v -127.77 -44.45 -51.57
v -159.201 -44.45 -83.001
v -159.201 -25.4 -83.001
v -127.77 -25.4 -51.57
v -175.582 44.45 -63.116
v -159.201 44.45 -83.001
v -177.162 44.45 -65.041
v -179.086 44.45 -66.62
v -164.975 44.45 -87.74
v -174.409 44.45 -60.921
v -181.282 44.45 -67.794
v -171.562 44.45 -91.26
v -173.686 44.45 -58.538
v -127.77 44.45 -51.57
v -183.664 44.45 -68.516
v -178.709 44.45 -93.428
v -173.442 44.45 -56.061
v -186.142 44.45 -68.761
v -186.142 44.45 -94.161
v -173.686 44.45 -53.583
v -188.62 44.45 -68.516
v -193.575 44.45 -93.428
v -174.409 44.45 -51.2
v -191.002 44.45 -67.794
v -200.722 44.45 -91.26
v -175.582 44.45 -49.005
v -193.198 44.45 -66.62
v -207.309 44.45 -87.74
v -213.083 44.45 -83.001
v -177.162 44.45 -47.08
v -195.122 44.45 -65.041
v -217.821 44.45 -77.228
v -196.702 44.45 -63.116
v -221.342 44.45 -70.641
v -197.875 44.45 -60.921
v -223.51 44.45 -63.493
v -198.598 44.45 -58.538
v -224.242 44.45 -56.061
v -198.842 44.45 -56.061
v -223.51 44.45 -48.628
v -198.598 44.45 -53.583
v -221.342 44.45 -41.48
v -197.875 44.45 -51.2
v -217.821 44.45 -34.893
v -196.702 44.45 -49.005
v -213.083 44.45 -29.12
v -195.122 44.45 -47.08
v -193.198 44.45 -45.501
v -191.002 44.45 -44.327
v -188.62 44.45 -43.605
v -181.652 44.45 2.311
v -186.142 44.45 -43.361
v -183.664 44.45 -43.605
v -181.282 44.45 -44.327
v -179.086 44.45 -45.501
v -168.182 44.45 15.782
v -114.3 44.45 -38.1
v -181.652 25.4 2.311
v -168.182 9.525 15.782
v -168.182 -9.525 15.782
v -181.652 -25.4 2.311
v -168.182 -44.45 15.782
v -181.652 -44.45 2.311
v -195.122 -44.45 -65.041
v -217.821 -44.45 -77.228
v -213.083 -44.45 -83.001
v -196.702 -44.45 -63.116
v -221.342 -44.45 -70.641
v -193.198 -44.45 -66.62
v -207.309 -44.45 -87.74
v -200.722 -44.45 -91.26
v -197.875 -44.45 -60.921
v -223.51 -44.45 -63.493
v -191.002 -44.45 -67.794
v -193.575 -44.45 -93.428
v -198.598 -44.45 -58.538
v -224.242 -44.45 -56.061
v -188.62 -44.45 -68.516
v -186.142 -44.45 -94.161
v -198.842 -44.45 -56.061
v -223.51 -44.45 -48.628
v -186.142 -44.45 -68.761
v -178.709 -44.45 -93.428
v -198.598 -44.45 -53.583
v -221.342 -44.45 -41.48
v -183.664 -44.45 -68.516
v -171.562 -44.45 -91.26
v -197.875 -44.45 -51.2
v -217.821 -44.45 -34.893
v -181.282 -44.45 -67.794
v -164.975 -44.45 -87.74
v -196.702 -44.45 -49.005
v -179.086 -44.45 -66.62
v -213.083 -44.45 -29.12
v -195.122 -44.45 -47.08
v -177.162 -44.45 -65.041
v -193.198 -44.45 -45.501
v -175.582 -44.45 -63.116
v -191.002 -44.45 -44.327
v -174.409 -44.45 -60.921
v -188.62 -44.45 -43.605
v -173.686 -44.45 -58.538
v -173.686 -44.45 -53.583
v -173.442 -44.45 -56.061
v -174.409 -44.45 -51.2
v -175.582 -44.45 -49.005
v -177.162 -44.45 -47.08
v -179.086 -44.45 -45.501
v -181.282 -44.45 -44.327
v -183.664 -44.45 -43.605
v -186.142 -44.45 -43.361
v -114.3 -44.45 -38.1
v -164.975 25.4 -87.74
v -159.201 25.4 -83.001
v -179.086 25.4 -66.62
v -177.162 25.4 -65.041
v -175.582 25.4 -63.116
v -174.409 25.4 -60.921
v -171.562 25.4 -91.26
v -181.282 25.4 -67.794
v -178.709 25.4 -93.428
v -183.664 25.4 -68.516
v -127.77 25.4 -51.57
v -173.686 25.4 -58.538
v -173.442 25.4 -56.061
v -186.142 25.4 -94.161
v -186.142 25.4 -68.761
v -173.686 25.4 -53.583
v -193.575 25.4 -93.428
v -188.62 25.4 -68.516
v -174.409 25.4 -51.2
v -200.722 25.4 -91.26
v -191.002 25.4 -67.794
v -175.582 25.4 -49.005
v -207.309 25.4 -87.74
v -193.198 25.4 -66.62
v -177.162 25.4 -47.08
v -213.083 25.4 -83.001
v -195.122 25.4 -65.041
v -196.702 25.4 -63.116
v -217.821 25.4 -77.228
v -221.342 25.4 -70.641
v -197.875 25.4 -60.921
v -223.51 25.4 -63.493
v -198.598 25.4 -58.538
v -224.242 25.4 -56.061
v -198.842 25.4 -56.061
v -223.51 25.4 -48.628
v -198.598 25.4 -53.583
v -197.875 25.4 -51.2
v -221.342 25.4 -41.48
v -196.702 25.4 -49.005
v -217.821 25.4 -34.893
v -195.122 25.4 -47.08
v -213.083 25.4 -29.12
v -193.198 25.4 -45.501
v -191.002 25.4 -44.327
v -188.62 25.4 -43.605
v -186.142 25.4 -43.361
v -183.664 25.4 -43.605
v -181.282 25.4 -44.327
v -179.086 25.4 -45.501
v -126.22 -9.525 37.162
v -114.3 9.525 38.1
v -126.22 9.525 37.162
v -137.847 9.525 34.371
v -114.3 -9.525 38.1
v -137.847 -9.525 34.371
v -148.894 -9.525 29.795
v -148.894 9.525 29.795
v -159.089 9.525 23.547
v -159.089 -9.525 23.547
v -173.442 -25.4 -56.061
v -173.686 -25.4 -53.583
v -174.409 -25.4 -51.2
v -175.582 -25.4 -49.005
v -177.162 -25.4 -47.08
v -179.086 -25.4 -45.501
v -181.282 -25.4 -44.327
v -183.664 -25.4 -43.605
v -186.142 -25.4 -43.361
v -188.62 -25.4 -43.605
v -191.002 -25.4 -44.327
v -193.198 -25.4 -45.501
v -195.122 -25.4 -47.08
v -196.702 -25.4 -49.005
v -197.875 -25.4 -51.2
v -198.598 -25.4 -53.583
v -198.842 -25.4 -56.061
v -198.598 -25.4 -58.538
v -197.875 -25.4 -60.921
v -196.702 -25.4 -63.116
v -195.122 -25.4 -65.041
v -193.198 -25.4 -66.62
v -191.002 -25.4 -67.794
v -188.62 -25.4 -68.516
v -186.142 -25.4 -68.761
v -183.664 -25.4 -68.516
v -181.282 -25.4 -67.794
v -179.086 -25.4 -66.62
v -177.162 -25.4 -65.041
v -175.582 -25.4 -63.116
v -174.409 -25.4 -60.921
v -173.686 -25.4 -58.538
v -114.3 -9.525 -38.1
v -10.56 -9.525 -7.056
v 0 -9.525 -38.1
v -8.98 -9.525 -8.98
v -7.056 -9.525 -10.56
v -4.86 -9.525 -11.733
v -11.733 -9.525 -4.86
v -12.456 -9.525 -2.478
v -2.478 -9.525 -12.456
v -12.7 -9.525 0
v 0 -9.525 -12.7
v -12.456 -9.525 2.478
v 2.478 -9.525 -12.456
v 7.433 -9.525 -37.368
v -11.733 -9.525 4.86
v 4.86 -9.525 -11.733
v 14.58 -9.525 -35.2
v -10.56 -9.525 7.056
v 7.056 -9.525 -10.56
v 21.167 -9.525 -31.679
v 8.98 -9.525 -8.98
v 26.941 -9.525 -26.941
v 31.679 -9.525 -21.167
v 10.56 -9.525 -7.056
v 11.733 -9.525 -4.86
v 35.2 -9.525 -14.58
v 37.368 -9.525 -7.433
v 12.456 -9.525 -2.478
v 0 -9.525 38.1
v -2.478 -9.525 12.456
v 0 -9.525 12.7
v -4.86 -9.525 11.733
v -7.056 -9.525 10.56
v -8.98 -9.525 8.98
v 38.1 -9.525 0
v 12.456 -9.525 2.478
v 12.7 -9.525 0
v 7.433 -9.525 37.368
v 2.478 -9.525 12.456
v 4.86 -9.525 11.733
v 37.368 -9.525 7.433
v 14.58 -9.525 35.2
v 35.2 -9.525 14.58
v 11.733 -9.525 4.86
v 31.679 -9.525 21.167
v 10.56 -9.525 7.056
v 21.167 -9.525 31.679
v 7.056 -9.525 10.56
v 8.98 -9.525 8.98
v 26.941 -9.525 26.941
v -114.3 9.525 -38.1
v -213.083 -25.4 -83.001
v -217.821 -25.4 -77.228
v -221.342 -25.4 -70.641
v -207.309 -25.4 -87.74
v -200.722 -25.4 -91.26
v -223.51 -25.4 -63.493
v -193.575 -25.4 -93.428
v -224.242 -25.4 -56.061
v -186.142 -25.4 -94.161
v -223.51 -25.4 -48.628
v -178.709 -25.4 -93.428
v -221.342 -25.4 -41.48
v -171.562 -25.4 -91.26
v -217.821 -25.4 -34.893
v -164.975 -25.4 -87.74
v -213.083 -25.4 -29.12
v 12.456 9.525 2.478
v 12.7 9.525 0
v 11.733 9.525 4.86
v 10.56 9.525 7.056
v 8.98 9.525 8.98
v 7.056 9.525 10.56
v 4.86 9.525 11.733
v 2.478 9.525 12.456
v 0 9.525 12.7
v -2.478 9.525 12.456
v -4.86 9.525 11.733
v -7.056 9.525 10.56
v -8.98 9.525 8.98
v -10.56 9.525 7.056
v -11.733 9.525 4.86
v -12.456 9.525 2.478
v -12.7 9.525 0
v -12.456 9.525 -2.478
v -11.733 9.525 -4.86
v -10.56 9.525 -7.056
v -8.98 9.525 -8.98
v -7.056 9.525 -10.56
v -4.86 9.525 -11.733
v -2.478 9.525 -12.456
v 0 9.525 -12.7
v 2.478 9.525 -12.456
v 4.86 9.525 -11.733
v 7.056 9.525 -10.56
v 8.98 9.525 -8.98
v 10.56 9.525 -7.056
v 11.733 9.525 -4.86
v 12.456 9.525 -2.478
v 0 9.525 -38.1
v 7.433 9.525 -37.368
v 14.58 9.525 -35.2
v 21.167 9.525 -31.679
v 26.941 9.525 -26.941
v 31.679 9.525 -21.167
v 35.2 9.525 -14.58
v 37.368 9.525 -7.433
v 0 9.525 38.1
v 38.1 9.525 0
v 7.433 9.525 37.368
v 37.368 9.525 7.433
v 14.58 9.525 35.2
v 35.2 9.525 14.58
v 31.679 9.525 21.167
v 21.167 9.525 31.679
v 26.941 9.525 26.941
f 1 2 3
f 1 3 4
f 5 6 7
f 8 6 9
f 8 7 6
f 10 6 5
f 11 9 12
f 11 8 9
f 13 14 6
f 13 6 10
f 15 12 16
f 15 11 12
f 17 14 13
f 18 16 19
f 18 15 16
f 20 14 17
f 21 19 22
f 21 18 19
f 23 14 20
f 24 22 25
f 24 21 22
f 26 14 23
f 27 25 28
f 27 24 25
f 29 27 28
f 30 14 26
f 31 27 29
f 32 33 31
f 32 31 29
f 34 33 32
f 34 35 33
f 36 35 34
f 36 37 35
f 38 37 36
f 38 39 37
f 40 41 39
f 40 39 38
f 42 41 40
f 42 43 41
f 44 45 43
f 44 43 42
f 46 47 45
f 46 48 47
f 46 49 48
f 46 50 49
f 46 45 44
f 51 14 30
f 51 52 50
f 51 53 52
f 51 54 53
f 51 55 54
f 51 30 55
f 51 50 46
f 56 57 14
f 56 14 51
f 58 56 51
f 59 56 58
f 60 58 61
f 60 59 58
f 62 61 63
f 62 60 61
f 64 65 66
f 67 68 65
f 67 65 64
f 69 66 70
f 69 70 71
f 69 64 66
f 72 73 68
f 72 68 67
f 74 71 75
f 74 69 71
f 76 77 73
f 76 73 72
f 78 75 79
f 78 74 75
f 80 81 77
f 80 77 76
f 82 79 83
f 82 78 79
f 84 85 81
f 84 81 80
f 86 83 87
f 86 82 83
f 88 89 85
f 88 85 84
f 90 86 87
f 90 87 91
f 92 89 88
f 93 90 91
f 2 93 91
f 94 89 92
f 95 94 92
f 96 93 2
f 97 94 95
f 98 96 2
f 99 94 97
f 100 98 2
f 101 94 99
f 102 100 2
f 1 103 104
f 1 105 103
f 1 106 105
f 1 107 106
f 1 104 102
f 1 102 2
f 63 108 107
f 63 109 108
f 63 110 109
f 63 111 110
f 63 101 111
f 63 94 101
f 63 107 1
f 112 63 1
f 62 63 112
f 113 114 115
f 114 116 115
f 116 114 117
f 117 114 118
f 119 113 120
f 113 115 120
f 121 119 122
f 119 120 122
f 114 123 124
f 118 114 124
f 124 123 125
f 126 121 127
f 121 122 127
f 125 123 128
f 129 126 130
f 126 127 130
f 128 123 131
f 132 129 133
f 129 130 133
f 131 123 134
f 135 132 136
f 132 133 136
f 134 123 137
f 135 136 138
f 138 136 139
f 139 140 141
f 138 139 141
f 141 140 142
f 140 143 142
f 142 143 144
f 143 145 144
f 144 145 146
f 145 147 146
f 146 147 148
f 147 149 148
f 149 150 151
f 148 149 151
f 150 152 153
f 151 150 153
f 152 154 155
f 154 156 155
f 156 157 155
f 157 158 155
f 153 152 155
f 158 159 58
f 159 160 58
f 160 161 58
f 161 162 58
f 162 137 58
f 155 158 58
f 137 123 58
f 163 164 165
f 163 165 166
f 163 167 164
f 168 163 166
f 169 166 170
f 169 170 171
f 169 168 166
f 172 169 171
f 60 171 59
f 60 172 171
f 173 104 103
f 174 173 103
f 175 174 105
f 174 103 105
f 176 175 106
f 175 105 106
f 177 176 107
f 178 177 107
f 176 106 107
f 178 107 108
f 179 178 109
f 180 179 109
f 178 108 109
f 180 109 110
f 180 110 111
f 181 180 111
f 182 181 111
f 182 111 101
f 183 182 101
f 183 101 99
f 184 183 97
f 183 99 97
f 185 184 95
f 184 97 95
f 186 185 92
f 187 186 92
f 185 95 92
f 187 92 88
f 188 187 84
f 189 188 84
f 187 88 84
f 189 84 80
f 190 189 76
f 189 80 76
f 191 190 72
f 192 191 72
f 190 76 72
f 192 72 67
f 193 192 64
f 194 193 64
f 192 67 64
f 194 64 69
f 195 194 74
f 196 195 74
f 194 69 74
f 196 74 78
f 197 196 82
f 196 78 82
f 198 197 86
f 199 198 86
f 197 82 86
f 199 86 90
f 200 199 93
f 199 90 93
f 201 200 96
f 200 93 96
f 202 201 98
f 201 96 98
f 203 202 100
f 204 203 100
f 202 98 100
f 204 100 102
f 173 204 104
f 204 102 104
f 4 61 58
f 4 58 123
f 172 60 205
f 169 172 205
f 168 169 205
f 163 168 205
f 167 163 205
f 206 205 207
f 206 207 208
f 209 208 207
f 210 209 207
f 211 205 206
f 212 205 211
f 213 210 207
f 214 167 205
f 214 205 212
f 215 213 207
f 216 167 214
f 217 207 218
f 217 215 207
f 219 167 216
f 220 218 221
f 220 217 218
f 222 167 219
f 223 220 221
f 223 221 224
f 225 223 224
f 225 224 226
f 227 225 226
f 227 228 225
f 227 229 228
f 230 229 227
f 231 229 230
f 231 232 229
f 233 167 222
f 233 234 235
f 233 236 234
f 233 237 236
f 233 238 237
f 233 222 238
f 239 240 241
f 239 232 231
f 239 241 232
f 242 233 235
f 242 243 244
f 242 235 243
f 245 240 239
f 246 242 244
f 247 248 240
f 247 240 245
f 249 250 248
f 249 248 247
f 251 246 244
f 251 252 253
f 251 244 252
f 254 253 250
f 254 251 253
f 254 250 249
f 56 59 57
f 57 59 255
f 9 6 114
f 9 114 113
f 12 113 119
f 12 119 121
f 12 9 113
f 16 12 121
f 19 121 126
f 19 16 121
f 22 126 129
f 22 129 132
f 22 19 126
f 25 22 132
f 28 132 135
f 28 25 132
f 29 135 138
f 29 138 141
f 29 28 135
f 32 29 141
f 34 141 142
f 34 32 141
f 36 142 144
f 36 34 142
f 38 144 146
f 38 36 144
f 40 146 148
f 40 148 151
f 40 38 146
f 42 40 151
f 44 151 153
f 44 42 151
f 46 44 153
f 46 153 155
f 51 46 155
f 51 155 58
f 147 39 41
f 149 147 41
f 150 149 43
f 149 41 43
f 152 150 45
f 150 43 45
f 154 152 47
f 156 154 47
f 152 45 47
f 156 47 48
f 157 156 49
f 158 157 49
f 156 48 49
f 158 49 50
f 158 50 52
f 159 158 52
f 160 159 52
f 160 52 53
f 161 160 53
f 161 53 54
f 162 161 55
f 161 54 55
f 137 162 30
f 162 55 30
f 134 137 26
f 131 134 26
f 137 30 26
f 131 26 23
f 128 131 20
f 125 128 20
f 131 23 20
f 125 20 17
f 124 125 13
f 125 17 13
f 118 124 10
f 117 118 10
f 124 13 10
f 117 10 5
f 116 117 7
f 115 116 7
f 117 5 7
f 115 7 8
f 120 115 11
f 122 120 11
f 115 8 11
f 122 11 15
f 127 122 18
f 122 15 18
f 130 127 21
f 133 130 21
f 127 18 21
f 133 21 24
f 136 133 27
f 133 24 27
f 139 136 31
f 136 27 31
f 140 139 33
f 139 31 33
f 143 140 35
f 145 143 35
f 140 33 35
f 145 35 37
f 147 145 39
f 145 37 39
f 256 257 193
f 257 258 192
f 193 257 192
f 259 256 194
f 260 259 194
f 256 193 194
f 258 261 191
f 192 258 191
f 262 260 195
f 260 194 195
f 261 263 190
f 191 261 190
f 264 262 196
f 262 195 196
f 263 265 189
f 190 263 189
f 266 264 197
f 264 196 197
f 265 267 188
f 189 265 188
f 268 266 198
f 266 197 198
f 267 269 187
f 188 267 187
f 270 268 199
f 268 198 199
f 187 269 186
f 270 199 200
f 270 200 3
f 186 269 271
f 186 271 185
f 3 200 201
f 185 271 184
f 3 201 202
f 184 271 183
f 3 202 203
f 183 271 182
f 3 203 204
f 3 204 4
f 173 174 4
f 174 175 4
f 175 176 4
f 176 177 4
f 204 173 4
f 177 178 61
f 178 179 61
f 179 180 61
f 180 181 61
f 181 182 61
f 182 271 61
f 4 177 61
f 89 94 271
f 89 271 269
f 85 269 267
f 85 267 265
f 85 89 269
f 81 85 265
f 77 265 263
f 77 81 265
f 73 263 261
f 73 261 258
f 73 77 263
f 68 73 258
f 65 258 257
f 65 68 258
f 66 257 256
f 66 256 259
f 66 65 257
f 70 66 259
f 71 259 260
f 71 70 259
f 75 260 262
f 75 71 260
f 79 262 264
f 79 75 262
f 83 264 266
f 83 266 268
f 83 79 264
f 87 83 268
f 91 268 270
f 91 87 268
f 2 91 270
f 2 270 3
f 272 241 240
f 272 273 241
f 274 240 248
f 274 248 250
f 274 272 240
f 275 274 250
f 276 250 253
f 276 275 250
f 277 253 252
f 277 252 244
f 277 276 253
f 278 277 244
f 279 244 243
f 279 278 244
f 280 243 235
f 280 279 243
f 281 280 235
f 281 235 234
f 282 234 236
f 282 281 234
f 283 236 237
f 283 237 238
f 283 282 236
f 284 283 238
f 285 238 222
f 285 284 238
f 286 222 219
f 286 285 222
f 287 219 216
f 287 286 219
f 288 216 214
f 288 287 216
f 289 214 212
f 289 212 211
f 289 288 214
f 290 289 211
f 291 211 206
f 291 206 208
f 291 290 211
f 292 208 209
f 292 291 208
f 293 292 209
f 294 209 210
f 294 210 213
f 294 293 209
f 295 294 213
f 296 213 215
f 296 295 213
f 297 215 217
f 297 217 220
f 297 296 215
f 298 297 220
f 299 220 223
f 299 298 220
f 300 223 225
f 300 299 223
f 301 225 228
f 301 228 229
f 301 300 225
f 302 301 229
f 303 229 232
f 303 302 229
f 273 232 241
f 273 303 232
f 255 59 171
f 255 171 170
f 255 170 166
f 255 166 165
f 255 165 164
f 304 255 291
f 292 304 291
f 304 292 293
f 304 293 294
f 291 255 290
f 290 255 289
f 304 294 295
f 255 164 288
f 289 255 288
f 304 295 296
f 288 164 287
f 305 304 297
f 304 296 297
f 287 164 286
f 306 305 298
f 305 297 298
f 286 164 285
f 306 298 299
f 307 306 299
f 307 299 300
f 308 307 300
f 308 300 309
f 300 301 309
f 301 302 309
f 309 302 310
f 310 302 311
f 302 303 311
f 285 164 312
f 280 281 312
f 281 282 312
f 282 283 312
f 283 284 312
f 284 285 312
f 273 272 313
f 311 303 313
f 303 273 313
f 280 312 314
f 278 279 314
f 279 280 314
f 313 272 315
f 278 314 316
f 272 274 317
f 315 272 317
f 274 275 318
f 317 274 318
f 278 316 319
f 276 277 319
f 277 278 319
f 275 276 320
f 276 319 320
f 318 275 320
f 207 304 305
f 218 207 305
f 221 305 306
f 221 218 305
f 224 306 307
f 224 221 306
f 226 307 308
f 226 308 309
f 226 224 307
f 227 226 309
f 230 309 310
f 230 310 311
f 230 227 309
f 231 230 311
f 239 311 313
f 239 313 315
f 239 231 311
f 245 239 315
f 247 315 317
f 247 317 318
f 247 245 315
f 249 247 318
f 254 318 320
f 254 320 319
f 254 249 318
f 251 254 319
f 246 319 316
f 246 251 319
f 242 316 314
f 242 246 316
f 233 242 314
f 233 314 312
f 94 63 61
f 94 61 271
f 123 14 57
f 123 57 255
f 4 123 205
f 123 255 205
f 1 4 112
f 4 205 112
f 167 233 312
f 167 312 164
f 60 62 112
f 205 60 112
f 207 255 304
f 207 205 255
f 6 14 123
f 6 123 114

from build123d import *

# Parameters (mm, degrees)
F0_R     = 12.7
F1_DEPTH = 9.525
F2_W     = 76.2
F2_H     = 88.9
F3_DEPTH = 19.05
F4_R     = 12.7
F5_DEPTH = 19.05
F6_R     = 12.7
F7_DEPTH = 19.05


with BuildPart() as f1:
    # F0 (on Front) → F1 (new body, symmetric)
    with BuildSketch(Plane.XZ):
        with BuildLine():
            Line((-114.3, -38.1), (0, -38.1))
            ThreePointArc((0, -38.1), (38.1, 0), (0, 38.1))
            Line((0, 38.1), (-114.3, 38.1))
            ThreePointArc((-114.3, 38.1), (-143.460478, 32.29962), (-168.181537, 15.781537))
            Line((-168.181537, 15.781537), (-114.3, -38.1))
        make_face()
        Circle(F0_R, mode=Mode.SUBTRACT)
    extrude(amount=F1_DEPTH, both=True)

    # F2 (on face) → F3 (join)
    with BuildSketch(Plane(origin=(-76.2, 0, -76.2), x_dir=(0.707107, 0, -0.707107), z_dir=(-0.707107, 0, -0.707107))):
        with Locations((-91.981537, 0)):
            Rectangle(F2_W, F2_H)
    extrude(amount=F3_DEPTH)

    # F4 (on face) → F5 (join)
    with BuildSketch(Plane.XZ.offset(44.45)):
        with BuildLine():
            ThreePointArc((-213.082817, -29.119744), (-213.082817, -83.001281), (-159.201281, -83.001281))
            Line((-159.201281, -83.001281), (-114.3, -38.1))
            Line((-114.3, -38.1), (-168.181537, 15.781537))
            Line((-168.181537, 15.781537), (-213.082817, -29.119744))
        make_face()
        with Locations((-186.142049, -56.060512)):
            Circle(F4_R, mode=Mode.SUBTRACT)
    extrude(amount=-F5_DEPTH)

    # F6 (on face) → F7 (join)
    with BuildSketch(Plane(origin=(0, 44.45, 0), x_dir=(-1, 0, 0), z_dir=(0, 1, 0))):
        with BuildLine():
            Line((213.082817, -29.119744), (168.181537, 15.781537))
            Line((168.181537, 15.781537), (114.3, -38.1))
            Line((114.3, -38.1), (159.201281, -83.001281))
            ThreePointArc((159.201281, -83.001281), (213.082817, -83.001281), (213.082817, -29.119744))
        make_face()
        with Locations((186.142049, -56.060512)):
            Circle(F6_R, mode=Mode.SUBTRACT)
    extrude(amount=-F7_DEPTH)


solid = f1.part
